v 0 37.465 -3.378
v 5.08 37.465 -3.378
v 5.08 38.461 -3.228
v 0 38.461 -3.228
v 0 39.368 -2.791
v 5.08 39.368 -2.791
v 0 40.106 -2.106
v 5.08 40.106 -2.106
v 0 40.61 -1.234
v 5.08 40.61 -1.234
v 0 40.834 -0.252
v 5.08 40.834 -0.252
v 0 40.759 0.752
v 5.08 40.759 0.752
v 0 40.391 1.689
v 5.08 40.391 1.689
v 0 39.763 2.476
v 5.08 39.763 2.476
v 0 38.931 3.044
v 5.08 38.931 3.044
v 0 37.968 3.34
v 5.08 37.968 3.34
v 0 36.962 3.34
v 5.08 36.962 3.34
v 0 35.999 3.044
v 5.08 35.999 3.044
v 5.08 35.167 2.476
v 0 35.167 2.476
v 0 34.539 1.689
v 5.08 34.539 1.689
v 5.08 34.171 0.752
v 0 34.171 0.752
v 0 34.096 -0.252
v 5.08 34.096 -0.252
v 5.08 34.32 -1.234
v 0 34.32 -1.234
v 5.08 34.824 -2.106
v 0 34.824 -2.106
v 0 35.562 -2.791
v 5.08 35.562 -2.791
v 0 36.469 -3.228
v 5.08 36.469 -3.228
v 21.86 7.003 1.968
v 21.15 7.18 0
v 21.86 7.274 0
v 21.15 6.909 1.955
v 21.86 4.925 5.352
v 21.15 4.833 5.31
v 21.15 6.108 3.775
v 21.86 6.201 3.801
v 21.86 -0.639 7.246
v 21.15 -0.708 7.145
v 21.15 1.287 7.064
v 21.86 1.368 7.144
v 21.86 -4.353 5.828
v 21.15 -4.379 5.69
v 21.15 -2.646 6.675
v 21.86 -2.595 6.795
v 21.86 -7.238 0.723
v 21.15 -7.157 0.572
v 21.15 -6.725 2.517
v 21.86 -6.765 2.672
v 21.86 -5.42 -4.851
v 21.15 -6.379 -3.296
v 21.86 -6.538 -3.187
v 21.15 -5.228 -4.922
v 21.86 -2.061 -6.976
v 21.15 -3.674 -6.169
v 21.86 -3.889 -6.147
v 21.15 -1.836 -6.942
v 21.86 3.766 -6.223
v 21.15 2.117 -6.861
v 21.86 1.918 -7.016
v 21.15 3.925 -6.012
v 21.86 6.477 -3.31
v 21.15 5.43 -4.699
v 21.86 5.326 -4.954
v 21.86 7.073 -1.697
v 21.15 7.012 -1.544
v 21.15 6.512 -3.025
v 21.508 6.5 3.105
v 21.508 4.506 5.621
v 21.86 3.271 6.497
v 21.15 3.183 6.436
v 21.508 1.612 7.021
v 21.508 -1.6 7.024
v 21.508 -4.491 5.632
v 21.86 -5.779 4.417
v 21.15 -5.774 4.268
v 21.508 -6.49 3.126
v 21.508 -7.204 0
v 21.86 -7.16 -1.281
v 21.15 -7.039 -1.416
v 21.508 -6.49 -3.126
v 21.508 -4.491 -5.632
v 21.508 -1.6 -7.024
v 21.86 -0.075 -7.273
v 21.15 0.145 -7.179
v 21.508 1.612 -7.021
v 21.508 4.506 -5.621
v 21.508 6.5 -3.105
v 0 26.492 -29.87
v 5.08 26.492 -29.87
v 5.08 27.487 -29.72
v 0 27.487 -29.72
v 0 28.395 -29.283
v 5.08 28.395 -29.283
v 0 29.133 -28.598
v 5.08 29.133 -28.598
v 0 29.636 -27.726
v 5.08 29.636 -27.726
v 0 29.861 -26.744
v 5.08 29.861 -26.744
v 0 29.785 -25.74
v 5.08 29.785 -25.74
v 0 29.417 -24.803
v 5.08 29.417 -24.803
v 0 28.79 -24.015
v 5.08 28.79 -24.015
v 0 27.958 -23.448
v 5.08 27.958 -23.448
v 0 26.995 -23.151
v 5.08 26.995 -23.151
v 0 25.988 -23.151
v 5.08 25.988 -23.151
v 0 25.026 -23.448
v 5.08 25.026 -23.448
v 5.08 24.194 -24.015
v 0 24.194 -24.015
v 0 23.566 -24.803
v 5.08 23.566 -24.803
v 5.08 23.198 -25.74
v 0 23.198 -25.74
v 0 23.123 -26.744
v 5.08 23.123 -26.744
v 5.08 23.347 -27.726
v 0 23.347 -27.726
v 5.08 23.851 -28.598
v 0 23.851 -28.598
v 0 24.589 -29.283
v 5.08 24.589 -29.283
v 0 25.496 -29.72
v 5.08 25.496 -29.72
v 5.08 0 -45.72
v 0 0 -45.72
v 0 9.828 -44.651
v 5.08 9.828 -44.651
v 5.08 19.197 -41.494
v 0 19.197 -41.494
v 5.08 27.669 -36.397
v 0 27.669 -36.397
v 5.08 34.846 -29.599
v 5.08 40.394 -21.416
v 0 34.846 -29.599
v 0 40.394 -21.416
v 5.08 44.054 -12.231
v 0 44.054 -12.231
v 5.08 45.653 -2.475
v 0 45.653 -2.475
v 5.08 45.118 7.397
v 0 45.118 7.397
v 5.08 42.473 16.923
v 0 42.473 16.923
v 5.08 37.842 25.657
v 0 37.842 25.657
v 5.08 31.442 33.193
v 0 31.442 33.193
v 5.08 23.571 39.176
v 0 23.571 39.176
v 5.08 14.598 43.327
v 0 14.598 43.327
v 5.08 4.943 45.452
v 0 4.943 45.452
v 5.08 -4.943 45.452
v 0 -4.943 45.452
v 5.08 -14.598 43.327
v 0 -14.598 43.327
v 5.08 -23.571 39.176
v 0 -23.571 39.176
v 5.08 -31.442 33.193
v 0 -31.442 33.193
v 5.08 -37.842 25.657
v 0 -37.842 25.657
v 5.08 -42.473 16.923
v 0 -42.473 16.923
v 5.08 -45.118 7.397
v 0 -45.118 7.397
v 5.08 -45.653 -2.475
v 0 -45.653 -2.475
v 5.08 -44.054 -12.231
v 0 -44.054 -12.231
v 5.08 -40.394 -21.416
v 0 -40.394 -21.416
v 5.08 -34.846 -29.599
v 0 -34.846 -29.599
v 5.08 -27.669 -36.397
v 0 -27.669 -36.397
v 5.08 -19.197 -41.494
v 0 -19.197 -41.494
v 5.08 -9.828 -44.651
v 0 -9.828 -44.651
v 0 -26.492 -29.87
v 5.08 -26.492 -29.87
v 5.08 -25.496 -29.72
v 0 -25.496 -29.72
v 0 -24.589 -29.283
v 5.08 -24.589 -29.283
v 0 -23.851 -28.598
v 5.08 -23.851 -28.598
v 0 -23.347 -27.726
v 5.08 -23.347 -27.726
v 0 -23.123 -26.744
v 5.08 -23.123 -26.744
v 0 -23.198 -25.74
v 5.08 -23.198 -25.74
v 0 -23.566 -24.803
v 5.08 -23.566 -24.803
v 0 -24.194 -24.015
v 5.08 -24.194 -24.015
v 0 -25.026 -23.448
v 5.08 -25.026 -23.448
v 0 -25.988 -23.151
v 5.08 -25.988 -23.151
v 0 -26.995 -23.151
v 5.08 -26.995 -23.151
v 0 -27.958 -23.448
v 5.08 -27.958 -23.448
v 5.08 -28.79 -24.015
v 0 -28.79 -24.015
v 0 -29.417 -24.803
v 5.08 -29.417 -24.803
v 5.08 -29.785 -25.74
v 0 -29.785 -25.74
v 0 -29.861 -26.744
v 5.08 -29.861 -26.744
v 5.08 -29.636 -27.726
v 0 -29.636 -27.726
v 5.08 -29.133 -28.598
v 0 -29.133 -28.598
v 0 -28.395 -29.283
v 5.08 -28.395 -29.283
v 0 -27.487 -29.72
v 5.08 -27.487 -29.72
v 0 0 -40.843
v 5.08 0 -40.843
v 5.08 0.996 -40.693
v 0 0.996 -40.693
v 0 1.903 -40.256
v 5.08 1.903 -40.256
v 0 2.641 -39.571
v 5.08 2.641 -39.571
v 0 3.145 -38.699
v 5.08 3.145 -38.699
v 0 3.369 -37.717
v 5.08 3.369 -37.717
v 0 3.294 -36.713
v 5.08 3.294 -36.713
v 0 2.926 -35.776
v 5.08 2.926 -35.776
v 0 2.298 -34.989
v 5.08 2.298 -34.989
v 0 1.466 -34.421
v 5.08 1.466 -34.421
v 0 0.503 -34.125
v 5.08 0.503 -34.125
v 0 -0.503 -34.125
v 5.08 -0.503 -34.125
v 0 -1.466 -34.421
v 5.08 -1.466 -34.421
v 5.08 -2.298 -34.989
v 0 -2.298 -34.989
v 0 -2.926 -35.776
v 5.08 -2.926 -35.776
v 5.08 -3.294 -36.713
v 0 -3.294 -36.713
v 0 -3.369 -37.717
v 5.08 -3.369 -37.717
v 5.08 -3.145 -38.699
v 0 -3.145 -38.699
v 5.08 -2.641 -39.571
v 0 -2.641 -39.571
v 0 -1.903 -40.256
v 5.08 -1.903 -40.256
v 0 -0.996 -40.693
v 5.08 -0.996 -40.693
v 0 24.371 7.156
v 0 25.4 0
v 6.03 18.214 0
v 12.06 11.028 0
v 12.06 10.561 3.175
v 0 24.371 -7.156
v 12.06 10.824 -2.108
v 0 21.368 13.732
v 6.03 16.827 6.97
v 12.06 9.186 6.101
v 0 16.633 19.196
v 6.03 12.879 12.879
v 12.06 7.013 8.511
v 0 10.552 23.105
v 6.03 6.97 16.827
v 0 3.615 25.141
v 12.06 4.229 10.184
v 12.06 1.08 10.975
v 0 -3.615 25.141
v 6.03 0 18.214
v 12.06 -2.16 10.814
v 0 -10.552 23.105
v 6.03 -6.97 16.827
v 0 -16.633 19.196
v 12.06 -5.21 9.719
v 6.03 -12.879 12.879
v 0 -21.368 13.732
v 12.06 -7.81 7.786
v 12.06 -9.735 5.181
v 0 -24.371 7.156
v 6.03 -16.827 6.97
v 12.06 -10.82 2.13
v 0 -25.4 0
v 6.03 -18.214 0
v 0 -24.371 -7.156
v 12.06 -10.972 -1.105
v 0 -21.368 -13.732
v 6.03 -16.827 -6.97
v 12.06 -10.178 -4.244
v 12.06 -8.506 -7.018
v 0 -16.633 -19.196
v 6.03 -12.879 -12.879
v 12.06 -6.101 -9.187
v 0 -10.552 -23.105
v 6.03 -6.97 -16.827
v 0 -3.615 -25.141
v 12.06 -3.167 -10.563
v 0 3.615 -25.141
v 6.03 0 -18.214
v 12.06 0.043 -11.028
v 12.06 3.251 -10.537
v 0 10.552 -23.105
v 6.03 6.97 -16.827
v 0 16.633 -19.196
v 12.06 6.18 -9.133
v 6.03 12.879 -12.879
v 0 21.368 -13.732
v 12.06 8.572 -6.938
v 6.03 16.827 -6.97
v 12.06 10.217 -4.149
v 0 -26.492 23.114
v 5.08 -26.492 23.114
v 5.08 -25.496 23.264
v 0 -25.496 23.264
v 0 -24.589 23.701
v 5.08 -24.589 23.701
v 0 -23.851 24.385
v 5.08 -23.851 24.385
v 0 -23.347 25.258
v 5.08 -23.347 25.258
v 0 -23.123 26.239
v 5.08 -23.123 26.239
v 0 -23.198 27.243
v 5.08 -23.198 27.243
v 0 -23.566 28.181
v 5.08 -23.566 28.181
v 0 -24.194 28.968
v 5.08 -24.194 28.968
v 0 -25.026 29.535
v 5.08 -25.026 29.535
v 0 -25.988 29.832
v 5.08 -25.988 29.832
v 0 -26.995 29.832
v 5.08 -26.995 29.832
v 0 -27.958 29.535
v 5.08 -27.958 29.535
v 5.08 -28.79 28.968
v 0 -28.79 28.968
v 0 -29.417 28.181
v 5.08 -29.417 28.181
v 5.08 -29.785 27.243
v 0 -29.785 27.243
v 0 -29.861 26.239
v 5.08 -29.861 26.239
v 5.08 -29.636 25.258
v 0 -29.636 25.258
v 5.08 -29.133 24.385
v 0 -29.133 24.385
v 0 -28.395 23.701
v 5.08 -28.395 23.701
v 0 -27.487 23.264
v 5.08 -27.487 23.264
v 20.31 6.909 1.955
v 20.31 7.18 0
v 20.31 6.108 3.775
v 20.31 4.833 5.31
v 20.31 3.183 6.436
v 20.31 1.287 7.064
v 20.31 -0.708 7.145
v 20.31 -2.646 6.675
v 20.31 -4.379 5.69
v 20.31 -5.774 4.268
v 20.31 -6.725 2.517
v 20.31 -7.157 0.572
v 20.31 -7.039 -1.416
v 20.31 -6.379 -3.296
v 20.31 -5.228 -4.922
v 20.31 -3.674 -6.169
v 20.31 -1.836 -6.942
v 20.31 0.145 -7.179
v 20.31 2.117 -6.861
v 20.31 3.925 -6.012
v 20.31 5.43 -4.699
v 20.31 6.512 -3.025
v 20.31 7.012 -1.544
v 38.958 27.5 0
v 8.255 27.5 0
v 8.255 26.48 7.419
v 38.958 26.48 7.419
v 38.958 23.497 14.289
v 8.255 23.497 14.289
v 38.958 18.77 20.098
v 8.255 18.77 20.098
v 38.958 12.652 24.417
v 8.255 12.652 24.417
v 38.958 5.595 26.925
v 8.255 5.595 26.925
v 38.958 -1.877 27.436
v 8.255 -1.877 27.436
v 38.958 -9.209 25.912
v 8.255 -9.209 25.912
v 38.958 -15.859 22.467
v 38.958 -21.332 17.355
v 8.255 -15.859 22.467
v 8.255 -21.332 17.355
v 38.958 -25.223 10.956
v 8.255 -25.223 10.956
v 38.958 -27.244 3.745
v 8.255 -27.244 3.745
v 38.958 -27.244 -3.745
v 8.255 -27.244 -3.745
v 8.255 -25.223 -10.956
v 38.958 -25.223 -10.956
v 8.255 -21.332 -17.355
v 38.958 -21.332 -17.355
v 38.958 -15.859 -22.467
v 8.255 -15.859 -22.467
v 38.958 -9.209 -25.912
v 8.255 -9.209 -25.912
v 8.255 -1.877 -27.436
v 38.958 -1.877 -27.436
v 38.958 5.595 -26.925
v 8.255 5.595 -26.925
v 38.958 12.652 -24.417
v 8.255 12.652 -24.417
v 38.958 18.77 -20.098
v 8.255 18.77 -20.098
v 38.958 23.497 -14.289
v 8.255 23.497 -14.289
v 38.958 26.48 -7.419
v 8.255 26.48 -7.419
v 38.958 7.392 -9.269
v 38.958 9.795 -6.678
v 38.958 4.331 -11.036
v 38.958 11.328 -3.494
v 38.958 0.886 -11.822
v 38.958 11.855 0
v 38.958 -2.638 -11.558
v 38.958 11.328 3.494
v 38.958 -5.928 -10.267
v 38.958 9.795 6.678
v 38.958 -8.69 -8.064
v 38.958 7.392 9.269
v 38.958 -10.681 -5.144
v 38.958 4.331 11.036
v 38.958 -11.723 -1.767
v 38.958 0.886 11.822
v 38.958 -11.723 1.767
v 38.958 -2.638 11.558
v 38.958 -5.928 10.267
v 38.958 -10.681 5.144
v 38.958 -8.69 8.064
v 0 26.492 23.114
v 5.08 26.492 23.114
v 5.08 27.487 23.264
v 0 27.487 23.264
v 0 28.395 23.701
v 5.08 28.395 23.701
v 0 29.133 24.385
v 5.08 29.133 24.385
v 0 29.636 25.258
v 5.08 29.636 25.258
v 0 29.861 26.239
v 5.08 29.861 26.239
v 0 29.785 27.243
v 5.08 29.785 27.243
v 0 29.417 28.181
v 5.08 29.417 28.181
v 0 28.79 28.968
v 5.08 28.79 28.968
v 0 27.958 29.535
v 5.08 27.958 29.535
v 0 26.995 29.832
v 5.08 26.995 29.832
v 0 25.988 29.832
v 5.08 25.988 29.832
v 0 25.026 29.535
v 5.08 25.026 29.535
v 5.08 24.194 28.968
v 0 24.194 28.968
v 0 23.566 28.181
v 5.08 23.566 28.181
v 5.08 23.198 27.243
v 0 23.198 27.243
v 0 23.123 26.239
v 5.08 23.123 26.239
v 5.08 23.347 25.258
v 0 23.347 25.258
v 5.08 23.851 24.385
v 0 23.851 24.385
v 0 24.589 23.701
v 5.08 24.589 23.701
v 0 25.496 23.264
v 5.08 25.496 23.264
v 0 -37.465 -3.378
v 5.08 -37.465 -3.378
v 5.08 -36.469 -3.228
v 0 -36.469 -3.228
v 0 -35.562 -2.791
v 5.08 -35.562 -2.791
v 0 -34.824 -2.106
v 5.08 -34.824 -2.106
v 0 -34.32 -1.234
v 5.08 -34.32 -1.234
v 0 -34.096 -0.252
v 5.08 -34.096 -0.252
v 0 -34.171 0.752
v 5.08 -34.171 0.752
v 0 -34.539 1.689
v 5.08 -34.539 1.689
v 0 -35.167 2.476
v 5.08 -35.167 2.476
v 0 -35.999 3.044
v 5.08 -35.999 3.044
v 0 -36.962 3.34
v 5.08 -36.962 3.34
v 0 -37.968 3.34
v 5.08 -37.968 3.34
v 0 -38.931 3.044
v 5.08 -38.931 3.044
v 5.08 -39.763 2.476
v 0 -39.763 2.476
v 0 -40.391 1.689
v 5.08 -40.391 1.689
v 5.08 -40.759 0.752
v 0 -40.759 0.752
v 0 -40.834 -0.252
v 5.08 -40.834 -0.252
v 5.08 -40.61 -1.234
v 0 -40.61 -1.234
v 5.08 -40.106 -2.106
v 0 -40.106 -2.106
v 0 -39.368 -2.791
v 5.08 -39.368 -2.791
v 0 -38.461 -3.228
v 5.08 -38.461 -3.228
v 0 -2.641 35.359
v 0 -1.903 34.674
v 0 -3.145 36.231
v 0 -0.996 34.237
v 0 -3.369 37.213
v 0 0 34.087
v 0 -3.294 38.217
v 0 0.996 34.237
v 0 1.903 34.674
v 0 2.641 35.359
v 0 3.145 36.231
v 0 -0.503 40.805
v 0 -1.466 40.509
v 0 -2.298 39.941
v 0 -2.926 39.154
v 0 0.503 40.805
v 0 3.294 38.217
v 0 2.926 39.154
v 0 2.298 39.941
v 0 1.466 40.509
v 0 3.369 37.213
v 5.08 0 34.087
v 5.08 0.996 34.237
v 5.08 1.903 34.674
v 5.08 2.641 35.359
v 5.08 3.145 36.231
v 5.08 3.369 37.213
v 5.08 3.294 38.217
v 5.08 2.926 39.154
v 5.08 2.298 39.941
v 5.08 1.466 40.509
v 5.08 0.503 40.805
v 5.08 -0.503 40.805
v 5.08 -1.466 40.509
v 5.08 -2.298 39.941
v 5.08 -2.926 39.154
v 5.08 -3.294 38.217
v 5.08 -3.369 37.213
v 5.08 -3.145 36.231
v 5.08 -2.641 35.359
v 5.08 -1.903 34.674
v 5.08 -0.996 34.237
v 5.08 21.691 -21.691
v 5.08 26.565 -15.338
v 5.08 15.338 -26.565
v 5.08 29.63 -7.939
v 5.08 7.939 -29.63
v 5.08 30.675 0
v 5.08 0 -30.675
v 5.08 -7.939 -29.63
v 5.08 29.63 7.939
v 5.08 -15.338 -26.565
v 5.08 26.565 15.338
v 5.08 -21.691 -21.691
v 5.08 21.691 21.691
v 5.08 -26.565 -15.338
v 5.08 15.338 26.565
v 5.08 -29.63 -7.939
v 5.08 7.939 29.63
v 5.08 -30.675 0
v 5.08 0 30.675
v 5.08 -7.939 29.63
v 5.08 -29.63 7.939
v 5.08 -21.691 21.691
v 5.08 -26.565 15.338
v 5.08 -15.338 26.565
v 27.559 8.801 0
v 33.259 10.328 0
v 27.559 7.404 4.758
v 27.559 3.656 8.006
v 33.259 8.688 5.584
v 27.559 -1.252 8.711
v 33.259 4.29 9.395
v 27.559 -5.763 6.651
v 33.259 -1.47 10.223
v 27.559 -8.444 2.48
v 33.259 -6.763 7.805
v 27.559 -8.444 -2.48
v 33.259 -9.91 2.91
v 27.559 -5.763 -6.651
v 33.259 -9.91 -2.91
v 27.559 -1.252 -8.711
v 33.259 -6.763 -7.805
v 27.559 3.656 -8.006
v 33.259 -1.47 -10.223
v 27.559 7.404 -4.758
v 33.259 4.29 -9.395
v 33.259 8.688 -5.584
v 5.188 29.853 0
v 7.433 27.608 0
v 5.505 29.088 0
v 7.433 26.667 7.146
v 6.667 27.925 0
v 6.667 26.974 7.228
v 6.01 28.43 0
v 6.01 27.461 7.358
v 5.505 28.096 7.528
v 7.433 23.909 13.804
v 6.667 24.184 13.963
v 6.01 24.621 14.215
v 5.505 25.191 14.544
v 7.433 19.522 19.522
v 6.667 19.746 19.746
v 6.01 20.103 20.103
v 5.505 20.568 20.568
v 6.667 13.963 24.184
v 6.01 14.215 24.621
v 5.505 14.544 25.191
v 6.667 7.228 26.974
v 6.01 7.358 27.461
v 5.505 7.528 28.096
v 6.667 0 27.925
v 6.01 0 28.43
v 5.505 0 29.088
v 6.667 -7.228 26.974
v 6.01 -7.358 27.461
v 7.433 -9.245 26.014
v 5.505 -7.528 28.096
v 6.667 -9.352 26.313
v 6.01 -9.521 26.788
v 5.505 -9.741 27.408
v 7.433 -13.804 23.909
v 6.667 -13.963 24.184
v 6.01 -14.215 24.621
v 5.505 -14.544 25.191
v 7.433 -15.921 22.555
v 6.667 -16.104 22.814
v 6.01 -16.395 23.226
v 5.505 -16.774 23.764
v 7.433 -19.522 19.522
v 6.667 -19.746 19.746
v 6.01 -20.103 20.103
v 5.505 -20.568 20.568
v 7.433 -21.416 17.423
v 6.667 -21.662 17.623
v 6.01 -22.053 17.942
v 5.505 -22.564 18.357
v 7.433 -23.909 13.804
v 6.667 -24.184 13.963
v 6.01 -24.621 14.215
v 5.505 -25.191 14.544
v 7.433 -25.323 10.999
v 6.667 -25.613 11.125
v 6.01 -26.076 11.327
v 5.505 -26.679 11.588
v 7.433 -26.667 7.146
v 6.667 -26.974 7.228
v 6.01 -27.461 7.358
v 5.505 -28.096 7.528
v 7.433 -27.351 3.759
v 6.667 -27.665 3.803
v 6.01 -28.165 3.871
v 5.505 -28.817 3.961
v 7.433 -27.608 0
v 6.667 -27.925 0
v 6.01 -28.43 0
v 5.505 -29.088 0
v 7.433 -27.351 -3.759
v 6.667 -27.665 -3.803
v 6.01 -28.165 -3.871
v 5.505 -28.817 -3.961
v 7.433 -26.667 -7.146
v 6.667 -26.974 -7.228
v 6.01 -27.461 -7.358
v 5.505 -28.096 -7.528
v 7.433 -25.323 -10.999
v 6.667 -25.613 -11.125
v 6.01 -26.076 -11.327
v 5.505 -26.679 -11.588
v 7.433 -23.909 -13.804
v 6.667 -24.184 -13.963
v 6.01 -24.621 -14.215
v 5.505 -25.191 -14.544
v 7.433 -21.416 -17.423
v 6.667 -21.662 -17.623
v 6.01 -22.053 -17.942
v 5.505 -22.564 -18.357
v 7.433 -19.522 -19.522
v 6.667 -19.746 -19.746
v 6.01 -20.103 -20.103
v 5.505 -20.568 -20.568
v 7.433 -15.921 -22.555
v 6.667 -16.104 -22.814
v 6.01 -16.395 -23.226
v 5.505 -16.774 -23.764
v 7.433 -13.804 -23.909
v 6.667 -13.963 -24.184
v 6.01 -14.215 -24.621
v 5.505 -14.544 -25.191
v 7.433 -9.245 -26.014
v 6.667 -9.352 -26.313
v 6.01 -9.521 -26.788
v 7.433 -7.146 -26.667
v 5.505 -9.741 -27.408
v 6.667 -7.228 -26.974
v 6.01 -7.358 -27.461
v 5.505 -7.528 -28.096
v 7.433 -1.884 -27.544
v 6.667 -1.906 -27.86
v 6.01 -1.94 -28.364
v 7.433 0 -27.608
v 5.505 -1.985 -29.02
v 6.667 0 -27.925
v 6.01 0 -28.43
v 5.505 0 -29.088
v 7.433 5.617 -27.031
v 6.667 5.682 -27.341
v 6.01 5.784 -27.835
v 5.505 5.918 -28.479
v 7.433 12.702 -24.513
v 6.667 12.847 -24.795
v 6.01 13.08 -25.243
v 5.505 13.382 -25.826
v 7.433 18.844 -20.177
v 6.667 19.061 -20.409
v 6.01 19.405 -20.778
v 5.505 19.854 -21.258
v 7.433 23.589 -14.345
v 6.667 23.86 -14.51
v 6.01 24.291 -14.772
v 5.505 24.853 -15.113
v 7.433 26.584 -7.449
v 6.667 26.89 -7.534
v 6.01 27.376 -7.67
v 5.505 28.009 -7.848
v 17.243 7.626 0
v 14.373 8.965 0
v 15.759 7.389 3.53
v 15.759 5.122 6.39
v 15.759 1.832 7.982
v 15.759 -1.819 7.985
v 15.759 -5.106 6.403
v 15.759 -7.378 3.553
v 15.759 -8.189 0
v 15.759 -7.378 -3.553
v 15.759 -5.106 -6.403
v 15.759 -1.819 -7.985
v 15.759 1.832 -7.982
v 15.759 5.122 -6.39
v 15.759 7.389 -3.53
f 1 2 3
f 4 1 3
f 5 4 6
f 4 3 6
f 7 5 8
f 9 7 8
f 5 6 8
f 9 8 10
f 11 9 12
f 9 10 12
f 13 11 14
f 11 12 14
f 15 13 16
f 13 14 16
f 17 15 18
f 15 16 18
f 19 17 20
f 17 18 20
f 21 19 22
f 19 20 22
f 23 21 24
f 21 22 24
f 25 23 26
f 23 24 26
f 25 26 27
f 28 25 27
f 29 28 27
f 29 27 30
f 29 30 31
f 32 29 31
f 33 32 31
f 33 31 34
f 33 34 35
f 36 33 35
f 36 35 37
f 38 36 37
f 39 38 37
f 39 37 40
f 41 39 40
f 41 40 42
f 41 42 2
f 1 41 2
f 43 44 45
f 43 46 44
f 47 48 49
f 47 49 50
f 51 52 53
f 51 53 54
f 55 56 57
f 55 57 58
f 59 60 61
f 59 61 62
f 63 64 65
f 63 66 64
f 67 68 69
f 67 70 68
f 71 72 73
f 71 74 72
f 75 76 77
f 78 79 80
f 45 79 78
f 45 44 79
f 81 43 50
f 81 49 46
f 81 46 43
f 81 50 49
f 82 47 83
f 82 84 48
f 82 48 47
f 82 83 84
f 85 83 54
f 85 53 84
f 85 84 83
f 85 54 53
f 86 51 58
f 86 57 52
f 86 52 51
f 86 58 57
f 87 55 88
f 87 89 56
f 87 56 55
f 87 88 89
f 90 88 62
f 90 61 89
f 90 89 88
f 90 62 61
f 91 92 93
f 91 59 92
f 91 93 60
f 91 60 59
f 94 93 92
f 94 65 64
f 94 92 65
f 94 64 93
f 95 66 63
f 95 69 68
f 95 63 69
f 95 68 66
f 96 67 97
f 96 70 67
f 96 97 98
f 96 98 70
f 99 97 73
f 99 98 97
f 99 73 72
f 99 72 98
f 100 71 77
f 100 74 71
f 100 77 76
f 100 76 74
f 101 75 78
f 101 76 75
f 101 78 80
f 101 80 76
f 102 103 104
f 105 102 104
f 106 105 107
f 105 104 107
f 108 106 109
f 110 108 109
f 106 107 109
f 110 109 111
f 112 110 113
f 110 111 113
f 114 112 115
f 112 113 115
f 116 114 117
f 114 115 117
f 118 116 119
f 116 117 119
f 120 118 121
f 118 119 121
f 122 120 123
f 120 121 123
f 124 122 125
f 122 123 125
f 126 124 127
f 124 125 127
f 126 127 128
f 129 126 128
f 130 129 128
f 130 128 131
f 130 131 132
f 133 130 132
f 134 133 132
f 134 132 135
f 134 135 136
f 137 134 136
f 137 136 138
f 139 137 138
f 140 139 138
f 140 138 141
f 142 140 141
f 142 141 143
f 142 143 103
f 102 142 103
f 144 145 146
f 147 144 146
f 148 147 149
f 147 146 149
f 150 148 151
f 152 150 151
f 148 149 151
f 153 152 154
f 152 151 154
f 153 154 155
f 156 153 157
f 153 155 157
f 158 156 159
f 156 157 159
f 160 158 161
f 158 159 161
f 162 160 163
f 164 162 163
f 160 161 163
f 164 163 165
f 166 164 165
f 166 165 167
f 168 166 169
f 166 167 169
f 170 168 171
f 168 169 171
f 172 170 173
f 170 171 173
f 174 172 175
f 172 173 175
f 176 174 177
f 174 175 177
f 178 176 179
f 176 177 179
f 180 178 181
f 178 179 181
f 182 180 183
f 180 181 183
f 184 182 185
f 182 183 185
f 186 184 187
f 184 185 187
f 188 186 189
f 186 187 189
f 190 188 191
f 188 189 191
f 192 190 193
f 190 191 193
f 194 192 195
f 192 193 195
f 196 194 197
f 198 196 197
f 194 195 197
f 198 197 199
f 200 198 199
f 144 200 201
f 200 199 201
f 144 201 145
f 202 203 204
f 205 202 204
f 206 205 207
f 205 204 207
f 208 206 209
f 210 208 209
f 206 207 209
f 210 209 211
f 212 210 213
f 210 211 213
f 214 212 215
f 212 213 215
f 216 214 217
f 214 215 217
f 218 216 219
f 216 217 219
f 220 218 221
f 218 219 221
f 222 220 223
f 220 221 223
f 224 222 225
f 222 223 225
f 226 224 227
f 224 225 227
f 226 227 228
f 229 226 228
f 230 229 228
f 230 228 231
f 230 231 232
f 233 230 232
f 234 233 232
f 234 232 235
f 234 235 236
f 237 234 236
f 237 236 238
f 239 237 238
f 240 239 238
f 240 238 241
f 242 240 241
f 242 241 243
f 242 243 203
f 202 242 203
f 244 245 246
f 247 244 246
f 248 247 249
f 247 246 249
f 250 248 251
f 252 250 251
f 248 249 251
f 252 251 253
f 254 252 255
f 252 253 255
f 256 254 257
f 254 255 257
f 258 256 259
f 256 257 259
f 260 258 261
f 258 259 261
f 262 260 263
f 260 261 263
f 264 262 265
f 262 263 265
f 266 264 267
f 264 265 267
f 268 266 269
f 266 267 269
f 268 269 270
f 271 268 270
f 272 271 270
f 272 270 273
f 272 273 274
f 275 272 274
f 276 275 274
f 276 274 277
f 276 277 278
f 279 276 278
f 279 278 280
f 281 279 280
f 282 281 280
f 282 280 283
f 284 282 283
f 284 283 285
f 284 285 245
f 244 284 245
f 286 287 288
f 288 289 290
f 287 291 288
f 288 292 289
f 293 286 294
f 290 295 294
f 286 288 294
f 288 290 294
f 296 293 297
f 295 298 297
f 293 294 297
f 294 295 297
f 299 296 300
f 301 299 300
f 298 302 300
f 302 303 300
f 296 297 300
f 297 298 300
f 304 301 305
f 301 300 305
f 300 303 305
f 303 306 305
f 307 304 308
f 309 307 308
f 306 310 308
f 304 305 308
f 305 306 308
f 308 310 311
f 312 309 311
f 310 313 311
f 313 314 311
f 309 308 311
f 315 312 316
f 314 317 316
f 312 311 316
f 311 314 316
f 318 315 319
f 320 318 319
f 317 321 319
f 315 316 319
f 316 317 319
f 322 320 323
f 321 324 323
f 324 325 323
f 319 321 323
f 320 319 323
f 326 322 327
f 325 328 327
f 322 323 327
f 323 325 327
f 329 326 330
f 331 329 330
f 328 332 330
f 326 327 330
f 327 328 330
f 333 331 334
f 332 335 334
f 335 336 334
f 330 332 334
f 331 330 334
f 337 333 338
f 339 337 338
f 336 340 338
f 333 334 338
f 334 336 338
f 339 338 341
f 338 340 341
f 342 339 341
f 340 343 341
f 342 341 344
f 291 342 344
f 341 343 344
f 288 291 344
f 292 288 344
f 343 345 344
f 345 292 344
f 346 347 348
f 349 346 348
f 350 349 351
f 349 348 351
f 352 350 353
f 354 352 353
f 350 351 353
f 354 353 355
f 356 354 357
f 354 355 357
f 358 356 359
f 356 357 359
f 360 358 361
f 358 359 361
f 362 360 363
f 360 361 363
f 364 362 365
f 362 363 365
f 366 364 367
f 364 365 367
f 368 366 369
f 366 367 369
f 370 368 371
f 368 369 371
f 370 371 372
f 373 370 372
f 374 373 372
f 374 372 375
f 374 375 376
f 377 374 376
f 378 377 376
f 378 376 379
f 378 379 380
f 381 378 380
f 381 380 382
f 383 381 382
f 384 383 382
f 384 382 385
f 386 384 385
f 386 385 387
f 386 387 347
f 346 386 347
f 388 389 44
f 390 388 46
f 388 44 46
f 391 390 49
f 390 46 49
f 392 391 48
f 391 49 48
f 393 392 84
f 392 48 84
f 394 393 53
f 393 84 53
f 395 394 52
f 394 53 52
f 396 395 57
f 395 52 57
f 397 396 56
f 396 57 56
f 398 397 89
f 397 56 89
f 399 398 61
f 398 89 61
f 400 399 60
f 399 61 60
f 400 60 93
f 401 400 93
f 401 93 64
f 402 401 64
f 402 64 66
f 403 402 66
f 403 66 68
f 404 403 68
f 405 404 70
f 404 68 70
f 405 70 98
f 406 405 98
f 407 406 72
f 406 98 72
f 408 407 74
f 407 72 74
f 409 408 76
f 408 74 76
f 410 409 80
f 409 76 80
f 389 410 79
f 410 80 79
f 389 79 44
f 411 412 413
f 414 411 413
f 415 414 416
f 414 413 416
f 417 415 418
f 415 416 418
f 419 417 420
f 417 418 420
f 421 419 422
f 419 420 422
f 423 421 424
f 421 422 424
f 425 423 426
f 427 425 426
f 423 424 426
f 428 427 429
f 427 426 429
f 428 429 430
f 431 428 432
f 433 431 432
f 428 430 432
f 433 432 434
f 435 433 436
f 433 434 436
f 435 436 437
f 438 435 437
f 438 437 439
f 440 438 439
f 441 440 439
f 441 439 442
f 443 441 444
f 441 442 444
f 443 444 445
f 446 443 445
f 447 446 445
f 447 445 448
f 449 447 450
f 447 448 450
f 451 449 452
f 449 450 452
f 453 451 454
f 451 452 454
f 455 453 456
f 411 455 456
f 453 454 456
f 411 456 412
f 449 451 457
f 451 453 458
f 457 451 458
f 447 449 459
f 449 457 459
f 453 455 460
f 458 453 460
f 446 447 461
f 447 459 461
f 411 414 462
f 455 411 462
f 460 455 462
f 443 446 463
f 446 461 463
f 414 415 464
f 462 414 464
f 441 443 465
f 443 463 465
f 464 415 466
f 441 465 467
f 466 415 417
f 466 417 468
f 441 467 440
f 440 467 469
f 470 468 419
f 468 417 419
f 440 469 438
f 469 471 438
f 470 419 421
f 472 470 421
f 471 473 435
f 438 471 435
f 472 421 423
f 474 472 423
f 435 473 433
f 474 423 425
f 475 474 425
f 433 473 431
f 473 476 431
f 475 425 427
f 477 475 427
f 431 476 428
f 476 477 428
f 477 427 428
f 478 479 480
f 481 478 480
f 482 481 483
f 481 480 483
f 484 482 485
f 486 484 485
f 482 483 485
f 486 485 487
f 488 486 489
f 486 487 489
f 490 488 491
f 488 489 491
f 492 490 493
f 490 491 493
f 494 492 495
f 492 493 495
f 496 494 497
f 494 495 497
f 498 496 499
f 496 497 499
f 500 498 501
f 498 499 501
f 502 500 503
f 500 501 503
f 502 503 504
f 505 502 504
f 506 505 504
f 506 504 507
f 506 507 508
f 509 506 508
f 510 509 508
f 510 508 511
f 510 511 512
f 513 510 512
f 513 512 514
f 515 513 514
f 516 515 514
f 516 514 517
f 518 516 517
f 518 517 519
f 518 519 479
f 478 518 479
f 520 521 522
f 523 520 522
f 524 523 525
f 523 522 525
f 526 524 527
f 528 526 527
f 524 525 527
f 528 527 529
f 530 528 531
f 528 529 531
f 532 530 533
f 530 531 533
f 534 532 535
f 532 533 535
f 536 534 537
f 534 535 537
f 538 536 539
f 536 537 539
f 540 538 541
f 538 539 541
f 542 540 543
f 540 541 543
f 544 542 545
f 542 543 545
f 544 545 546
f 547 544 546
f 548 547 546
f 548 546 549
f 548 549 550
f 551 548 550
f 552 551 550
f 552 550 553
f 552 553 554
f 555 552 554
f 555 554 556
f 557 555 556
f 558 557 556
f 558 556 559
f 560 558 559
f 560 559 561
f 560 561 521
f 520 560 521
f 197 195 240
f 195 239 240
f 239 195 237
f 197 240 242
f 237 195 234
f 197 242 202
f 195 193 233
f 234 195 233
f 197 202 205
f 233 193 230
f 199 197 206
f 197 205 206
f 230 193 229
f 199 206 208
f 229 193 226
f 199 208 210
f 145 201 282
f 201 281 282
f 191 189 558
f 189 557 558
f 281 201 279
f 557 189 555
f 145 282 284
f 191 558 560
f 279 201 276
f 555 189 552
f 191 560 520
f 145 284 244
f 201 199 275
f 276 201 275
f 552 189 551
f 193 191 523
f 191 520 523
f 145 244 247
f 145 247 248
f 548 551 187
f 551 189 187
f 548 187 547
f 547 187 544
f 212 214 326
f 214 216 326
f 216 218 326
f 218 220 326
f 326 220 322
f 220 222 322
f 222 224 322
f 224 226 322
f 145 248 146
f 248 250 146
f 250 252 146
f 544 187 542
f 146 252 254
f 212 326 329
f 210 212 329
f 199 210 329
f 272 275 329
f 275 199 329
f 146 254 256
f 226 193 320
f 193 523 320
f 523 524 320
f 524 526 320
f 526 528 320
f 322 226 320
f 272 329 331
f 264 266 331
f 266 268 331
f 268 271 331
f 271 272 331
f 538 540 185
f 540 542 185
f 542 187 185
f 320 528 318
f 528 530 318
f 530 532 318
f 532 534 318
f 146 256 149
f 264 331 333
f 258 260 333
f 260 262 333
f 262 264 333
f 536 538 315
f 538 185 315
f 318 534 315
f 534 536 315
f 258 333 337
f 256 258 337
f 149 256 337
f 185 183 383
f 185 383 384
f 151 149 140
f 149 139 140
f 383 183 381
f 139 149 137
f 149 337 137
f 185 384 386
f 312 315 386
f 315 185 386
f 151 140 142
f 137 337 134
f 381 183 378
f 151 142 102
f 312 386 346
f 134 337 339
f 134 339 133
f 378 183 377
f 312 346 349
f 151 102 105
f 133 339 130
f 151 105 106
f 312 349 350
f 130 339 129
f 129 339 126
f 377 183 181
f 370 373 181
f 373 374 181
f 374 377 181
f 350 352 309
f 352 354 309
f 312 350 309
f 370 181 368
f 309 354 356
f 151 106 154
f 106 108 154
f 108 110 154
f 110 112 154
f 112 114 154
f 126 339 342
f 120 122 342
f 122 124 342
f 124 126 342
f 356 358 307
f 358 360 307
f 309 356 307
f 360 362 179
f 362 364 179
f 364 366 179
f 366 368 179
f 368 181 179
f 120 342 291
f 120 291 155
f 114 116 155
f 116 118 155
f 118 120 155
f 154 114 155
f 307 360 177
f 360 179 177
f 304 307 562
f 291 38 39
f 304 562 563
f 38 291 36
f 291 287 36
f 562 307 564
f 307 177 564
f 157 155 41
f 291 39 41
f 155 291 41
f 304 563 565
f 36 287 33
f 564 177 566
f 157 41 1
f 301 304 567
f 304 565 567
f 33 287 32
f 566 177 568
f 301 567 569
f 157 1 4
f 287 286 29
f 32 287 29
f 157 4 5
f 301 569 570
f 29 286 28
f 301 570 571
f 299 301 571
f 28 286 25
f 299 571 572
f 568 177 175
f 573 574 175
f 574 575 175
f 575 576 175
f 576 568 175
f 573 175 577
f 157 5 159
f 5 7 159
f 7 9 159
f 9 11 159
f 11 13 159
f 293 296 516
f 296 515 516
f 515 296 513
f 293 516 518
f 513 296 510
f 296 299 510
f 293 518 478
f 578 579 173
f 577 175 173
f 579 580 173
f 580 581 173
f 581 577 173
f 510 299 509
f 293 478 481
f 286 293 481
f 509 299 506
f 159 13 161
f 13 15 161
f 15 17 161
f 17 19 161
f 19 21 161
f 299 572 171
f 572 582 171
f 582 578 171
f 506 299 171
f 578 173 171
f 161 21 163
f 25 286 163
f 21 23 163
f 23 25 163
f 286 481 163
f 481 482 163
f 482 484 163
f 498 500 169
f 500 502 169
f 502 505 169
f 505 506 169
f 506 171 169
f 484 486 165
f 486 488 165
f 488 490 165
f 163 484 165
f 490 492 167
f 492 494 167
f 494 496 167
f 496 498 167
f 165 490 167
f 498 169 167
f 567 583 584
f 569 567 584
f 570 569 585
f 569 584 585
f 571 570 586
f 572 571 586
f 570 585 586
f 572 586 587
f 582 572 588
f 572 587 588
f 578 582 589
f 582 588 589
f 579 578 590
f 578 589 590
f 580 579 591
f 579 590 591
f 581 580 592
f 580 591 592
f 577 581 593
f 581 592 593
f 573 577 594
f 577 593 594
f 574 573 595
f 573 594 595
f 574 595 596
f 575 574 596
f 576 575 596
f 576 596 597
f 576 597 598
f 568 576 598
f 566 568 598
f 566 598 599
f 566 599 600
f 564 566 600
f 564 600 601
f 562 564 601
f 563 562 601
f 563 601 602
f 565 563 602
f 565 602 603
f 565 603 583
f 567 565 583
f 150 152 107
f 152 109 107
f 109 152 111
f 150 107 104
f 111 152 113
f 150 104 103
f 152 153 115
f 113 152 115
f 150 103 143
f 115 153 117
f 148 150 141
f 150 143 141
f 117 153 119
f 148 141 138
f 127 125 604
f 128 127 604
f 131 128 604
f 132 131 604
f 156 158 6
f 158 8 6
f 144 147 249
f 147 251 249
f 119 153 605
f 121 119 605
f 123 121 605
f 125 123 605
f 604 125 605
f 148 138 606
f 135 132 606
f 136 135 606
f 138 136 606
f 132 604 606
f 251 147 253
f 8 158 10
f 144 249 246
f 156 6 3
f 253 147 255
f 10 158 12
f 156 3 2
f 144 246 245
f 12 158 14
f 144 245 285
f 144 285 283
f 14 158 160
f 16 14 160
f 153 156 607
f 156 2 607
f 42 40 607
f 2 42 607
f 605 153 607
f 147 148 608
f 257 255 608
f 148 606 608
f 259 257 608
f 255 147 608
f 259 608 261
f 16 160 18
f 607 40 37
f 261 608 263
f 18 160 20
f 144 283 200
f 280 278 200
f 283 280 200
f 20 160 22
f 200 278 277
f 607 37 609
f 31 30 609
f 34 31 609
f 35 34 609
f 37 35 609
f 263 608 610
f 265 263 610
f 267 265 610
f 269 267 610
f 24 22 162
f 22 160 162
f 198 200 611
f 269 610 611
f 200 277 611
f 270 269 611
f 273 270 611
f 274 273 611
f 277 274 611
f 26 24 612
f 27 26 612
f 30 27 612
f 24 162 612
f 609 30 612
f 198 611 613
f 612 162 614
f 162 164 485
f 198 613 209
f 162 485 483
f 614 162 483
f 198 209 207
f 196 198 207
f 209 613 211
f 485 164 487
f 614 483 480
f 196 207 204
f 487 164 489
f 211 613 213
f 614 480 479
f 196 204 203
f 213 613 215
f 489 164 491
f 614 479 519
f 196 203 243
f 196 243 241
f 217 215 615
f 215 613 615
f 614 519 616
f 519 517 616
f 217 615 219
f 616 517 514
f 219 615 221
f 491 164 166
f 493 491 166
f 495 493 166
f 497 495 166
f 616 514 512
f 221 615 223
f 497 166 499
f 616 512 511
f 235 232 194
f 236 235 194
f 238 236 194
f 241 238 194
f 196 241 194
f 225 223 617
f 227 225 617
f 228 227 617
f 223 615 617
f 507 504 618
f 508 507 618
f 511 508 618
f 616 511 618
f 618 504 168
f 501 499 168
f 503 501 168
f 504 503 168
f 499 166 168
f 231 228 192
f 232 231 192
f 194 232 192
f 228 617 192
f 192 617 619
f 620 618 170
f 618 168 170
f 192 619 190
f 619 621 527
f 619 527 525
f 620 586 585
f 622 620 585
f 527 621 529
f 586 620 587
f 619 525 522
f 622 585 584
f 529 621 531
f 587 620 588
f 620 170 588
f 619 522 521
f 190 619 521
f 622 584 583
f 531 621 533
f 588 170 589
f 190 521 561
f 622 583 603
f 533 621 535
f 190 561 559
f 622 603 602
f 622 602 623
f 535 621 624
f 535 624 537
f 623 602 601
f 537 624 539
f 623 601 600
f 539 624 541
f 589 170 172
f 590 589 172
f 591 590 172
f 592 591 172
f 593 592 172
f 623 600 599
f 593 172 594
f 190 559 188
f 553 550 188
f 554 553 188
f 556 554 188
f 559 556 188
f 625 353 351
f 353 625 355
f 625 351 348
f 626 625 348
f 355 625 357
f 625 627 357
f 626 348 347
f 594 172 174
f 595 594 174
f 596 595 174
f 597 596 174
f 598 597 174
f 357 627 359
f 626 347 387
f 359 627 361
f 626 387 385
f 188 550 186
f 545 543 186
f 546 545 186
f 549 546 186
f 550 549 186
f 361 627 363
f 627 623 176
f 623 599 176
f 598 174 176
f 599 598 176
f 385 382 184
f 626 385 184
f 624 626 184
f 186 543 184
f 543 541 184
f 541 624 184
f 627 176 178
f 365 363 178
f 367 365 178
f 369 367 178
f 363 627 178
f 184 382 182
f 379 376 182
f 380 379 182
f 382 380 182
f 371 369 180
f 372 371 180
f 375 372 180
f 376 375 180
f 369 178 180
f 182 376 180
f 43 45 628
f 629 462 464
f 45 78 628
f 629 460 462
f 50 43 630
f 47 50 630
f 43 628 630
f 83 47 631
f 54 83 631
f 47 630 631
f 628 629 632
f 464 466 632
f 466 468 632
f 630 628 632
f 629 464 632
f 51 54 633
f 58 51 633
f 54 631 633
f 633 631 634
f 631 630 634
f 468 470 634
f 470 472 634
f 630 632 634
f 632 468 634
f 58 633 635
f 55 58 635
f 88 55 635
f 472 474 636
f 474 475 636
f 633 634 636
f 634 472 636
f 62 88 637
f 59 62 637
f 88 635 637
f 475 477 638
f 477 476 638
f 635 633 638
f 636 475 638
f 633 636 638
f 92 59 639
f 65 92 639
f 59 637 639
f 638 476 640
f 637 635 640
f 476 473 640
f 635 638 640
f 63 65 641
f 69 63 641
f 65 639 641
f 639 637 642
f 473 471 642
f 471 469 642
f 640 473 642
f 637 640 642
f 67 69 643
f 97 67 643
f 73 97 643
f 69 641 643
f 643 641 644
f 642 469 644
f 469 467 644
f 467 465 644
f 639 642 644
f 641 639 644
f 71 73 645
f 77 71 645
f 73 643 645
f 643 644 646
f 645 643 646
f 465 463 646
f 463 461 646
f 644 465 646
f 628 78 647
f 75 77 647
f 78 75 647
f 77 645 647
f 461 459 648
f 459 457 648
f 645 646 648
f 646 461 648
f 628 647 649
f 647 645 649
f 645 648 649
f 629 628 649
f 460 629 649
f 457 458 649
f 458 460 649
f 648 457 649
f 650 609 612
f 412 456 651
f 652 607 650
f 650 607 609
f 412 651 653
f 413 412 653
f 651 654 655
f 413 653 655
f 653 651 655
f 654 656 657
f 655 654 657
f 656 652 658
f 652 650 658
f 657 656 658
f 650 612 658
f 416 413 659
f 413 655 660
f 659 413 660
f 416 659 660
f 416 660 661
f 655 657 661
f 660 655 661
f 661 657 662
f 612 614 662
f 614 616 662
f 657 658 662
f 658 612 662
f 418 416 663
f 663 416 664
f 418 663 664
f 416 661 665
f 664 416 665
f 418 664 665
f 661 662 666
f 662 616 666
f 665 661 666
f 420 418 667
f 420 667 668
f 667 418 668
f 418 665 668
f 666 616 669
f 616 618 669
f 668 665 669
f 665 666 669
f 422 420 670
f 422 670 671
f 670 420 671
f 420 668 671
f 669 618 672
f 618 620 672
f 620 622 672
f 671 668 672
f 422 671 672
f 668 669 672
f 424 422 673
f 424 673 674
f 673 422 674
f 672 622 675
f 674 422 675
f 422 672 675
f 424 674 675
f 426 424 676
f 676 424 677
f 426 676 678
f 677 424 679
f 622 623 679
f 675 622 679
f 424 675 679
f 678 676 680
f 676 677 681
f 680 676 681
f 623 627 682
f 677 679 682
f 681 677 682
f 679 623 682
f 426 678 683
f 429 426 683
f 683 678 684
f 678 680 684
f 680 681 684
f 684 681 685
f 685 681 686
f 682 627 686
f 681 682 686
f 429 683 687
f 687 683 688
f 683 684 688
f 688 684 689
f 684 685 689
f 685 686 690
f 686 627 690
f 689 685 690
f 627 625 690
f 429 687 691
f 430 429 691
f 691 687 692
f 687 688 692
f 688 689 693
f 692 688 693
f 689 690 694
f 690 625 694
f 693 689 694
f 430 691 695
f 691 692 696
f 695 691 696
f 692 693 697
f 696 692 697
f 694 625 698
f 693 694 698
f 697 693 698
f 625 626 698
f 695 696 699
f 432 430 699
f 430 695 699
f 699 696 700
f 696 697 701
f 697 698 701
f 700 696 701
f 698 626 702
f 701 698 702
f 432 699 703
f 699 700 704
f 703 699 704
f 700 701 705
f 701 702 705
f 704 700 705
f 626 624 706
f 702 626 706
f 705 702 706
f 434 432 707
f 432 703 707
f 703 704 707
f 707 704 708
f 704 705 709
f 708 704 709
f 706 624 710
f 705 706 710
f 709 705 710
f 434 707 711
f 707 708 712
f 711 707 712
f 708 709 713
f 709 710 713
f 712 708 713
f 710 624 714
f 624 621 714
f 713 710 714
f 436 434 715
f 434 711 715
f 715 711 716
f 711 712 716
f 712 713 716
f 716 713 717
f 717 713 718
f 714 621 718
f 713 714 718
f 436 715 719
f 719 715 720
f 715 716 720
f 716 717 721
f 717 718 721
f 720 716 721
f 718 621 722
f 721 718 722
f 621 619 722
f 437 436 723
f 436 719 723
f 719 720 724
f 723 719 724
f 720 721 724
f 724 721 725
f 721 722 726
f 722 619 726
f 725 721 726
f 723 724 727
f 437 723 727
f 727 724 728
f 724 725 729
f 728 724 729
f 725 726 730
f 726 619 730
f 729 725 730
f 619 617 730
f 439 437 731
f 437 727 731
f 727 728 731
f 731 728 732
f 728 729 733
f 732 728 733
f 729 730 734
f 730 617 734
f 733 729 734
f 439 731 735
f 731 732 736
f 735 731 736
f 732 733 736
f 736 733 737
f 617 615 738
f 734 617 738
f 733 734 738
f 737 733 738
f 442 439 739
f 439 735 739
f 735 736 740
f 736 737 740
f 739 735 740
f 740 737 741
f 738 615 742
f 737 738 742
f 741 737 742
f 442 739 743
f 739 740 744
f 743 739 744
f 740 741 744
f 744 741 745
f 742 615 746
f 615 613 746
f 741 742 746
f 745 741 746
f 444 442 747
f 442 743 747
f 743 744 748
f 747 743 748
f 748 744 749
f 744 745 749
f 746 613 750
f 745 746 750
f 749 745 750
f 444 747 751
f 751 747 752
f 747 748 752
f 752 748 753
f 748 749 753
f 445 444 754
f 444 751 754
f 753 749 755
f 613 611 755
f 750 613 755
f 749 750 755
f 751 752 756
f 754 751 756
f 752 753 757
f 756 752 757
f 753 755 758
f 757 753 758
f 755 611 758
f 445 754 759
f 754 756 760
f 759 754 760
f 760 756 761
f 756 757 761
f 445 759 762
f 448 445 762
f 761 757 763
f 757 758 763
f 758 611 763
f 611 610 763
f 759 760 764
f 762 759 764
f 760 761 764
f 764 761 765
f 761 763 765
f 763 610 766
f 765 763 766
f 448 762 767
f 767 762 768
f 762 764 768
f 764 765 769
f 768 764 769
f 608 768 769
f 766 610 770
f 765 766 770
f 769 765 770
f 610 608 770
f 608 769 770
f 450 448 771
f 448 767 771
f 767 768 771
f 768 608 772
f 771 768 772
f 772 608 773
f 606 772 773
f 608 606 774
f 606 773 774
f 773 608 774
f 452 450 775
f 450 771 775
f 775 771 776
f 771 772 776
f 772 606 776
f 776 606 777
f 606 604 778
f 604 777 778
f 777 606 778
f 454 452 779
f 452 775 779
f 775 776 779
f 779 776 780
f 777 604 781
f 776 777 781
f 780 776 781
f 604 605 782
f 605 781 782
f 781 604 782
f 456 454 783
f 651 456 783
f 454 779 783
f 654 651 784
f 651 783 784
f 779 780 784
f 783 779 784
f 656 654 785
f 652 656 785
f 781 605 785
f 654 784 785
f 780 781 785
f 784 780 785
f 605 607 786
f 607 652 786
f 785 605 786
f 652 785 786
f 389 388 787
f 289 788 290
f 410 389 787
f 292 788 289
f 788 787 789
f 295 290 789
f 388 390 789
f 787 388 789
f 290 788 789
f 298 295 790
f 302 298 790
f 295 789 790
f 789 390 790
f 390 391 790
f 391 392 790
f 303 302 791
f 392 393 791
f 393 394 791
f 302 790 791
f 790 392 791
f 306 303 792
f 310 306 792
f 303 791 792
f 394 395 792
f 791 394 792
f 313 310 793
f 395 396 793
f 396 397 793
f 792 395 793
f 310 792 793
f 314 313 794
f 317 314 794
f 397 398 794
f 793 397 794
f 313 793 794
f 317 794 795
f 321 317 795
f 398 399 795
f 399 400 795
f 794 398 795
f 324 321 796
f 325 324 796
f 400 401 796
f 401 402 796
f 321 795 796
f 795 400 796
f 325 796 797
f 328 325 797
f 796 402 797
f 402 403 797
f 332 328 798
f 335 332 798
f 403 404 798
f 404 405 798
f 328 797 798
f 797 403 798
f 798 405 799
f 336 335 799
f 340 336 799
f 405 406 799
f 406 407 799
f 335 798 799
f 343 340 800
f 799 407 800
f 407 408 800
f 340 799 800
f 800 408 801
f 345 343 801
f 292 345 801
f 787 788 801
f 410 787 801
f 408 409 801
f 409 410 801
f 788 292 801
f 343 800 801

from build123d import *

# Parameters (mm, degrees)
RAO_OUTLET_RADIUS_R     = 2.742884532
F_1_4_CLEARANCE_HOLE1_D = 6.7564
SKETCH5_OUTSIDE_W       = 174.362
SKETCH5_OUTSIDE_H       = 174.362
SKETCH5_OUTSIDE_R       = 45.72
CUT_EXTRUDE1_DEPTH      = 5.08
FILLET1_R               = 3.175
RAO_INLET_RADIUS_R      = 10.770489


with BuildPart() as part:
    # Sketch1 → Nozzle (revolve)
    with BuildSketch(Plane.XY):
        Polygon((15.288121734, 7.180326), (21.511121734, 7.180326), (38.957805968, 11.855150951), (38.957805968, 27.500000118), (5.08, 27.500000118), (5.08, 66.870000118), (0, 66.870000118), (0, 25.4), align=None)
    revolve(axis=Axis((0, 0, 0), (1, 0, 0)))

    # Rao outlet radius
    rao_outlet_radius_edges = [part.edges().sort_by_distance(p)[0] for p in [
        (21.511121734, -7.180326, 0),
    ]]
    fillet(rao_outlet_radius_edges, radius=RAO_OUTLET_RADIUS_R)

    # 1/4 Clearance Hole1 (through all)
    with Locations(Plane.ZY):
        with Locations((37.465, 0), (26.491755557, -26.491755557), (0, -37.465), (-26.491755557, -26.491755557), (-37.465, 0), (-26.491755557, 26.491755557), (0, 37.465), (26.491755557, 26.491755557), (0, 0)):
            Hole(F_1_4_CLEARANCE_HOLE1_D / 2)

    # Sketch5 outside → Cut-Extrude1 (cut)
    with BuildSketch(Plane(origin=(0, 0, 0), x_dir=(0, 0, -1), z_dir=(1, 0, 0))):
        Rectangle(SKETCH5_OUTSIDE_W, SKETCH5_OUTSIDE_H)
        Circle(SKETCH5_OUTSIDE_R, mode=Mode.SUBTRACT)
    extrude(amount=CUT_EXTRUDE1_DEPTH, mode=Mode.SUBTRACT)

    # Fillet1
    fillet1_edges = [part.edges().sort_by_distance(p)[0] for p in [
        (5.08, -27.500000118, 0),
    ]]
    fillet(fillet1_edges, radius=FILLET1_R)

    # Rao Inlet radius
    rao_inlet_radius_edges = [part.edges().sort_by_distance(p)[0] for p in [
        (15.288121734, -7.180326, 0),
    ]]
    fillet(rao_inlet_radius_edges, radius=RAO_INLET_RADIUS_R)


solid = part.part
